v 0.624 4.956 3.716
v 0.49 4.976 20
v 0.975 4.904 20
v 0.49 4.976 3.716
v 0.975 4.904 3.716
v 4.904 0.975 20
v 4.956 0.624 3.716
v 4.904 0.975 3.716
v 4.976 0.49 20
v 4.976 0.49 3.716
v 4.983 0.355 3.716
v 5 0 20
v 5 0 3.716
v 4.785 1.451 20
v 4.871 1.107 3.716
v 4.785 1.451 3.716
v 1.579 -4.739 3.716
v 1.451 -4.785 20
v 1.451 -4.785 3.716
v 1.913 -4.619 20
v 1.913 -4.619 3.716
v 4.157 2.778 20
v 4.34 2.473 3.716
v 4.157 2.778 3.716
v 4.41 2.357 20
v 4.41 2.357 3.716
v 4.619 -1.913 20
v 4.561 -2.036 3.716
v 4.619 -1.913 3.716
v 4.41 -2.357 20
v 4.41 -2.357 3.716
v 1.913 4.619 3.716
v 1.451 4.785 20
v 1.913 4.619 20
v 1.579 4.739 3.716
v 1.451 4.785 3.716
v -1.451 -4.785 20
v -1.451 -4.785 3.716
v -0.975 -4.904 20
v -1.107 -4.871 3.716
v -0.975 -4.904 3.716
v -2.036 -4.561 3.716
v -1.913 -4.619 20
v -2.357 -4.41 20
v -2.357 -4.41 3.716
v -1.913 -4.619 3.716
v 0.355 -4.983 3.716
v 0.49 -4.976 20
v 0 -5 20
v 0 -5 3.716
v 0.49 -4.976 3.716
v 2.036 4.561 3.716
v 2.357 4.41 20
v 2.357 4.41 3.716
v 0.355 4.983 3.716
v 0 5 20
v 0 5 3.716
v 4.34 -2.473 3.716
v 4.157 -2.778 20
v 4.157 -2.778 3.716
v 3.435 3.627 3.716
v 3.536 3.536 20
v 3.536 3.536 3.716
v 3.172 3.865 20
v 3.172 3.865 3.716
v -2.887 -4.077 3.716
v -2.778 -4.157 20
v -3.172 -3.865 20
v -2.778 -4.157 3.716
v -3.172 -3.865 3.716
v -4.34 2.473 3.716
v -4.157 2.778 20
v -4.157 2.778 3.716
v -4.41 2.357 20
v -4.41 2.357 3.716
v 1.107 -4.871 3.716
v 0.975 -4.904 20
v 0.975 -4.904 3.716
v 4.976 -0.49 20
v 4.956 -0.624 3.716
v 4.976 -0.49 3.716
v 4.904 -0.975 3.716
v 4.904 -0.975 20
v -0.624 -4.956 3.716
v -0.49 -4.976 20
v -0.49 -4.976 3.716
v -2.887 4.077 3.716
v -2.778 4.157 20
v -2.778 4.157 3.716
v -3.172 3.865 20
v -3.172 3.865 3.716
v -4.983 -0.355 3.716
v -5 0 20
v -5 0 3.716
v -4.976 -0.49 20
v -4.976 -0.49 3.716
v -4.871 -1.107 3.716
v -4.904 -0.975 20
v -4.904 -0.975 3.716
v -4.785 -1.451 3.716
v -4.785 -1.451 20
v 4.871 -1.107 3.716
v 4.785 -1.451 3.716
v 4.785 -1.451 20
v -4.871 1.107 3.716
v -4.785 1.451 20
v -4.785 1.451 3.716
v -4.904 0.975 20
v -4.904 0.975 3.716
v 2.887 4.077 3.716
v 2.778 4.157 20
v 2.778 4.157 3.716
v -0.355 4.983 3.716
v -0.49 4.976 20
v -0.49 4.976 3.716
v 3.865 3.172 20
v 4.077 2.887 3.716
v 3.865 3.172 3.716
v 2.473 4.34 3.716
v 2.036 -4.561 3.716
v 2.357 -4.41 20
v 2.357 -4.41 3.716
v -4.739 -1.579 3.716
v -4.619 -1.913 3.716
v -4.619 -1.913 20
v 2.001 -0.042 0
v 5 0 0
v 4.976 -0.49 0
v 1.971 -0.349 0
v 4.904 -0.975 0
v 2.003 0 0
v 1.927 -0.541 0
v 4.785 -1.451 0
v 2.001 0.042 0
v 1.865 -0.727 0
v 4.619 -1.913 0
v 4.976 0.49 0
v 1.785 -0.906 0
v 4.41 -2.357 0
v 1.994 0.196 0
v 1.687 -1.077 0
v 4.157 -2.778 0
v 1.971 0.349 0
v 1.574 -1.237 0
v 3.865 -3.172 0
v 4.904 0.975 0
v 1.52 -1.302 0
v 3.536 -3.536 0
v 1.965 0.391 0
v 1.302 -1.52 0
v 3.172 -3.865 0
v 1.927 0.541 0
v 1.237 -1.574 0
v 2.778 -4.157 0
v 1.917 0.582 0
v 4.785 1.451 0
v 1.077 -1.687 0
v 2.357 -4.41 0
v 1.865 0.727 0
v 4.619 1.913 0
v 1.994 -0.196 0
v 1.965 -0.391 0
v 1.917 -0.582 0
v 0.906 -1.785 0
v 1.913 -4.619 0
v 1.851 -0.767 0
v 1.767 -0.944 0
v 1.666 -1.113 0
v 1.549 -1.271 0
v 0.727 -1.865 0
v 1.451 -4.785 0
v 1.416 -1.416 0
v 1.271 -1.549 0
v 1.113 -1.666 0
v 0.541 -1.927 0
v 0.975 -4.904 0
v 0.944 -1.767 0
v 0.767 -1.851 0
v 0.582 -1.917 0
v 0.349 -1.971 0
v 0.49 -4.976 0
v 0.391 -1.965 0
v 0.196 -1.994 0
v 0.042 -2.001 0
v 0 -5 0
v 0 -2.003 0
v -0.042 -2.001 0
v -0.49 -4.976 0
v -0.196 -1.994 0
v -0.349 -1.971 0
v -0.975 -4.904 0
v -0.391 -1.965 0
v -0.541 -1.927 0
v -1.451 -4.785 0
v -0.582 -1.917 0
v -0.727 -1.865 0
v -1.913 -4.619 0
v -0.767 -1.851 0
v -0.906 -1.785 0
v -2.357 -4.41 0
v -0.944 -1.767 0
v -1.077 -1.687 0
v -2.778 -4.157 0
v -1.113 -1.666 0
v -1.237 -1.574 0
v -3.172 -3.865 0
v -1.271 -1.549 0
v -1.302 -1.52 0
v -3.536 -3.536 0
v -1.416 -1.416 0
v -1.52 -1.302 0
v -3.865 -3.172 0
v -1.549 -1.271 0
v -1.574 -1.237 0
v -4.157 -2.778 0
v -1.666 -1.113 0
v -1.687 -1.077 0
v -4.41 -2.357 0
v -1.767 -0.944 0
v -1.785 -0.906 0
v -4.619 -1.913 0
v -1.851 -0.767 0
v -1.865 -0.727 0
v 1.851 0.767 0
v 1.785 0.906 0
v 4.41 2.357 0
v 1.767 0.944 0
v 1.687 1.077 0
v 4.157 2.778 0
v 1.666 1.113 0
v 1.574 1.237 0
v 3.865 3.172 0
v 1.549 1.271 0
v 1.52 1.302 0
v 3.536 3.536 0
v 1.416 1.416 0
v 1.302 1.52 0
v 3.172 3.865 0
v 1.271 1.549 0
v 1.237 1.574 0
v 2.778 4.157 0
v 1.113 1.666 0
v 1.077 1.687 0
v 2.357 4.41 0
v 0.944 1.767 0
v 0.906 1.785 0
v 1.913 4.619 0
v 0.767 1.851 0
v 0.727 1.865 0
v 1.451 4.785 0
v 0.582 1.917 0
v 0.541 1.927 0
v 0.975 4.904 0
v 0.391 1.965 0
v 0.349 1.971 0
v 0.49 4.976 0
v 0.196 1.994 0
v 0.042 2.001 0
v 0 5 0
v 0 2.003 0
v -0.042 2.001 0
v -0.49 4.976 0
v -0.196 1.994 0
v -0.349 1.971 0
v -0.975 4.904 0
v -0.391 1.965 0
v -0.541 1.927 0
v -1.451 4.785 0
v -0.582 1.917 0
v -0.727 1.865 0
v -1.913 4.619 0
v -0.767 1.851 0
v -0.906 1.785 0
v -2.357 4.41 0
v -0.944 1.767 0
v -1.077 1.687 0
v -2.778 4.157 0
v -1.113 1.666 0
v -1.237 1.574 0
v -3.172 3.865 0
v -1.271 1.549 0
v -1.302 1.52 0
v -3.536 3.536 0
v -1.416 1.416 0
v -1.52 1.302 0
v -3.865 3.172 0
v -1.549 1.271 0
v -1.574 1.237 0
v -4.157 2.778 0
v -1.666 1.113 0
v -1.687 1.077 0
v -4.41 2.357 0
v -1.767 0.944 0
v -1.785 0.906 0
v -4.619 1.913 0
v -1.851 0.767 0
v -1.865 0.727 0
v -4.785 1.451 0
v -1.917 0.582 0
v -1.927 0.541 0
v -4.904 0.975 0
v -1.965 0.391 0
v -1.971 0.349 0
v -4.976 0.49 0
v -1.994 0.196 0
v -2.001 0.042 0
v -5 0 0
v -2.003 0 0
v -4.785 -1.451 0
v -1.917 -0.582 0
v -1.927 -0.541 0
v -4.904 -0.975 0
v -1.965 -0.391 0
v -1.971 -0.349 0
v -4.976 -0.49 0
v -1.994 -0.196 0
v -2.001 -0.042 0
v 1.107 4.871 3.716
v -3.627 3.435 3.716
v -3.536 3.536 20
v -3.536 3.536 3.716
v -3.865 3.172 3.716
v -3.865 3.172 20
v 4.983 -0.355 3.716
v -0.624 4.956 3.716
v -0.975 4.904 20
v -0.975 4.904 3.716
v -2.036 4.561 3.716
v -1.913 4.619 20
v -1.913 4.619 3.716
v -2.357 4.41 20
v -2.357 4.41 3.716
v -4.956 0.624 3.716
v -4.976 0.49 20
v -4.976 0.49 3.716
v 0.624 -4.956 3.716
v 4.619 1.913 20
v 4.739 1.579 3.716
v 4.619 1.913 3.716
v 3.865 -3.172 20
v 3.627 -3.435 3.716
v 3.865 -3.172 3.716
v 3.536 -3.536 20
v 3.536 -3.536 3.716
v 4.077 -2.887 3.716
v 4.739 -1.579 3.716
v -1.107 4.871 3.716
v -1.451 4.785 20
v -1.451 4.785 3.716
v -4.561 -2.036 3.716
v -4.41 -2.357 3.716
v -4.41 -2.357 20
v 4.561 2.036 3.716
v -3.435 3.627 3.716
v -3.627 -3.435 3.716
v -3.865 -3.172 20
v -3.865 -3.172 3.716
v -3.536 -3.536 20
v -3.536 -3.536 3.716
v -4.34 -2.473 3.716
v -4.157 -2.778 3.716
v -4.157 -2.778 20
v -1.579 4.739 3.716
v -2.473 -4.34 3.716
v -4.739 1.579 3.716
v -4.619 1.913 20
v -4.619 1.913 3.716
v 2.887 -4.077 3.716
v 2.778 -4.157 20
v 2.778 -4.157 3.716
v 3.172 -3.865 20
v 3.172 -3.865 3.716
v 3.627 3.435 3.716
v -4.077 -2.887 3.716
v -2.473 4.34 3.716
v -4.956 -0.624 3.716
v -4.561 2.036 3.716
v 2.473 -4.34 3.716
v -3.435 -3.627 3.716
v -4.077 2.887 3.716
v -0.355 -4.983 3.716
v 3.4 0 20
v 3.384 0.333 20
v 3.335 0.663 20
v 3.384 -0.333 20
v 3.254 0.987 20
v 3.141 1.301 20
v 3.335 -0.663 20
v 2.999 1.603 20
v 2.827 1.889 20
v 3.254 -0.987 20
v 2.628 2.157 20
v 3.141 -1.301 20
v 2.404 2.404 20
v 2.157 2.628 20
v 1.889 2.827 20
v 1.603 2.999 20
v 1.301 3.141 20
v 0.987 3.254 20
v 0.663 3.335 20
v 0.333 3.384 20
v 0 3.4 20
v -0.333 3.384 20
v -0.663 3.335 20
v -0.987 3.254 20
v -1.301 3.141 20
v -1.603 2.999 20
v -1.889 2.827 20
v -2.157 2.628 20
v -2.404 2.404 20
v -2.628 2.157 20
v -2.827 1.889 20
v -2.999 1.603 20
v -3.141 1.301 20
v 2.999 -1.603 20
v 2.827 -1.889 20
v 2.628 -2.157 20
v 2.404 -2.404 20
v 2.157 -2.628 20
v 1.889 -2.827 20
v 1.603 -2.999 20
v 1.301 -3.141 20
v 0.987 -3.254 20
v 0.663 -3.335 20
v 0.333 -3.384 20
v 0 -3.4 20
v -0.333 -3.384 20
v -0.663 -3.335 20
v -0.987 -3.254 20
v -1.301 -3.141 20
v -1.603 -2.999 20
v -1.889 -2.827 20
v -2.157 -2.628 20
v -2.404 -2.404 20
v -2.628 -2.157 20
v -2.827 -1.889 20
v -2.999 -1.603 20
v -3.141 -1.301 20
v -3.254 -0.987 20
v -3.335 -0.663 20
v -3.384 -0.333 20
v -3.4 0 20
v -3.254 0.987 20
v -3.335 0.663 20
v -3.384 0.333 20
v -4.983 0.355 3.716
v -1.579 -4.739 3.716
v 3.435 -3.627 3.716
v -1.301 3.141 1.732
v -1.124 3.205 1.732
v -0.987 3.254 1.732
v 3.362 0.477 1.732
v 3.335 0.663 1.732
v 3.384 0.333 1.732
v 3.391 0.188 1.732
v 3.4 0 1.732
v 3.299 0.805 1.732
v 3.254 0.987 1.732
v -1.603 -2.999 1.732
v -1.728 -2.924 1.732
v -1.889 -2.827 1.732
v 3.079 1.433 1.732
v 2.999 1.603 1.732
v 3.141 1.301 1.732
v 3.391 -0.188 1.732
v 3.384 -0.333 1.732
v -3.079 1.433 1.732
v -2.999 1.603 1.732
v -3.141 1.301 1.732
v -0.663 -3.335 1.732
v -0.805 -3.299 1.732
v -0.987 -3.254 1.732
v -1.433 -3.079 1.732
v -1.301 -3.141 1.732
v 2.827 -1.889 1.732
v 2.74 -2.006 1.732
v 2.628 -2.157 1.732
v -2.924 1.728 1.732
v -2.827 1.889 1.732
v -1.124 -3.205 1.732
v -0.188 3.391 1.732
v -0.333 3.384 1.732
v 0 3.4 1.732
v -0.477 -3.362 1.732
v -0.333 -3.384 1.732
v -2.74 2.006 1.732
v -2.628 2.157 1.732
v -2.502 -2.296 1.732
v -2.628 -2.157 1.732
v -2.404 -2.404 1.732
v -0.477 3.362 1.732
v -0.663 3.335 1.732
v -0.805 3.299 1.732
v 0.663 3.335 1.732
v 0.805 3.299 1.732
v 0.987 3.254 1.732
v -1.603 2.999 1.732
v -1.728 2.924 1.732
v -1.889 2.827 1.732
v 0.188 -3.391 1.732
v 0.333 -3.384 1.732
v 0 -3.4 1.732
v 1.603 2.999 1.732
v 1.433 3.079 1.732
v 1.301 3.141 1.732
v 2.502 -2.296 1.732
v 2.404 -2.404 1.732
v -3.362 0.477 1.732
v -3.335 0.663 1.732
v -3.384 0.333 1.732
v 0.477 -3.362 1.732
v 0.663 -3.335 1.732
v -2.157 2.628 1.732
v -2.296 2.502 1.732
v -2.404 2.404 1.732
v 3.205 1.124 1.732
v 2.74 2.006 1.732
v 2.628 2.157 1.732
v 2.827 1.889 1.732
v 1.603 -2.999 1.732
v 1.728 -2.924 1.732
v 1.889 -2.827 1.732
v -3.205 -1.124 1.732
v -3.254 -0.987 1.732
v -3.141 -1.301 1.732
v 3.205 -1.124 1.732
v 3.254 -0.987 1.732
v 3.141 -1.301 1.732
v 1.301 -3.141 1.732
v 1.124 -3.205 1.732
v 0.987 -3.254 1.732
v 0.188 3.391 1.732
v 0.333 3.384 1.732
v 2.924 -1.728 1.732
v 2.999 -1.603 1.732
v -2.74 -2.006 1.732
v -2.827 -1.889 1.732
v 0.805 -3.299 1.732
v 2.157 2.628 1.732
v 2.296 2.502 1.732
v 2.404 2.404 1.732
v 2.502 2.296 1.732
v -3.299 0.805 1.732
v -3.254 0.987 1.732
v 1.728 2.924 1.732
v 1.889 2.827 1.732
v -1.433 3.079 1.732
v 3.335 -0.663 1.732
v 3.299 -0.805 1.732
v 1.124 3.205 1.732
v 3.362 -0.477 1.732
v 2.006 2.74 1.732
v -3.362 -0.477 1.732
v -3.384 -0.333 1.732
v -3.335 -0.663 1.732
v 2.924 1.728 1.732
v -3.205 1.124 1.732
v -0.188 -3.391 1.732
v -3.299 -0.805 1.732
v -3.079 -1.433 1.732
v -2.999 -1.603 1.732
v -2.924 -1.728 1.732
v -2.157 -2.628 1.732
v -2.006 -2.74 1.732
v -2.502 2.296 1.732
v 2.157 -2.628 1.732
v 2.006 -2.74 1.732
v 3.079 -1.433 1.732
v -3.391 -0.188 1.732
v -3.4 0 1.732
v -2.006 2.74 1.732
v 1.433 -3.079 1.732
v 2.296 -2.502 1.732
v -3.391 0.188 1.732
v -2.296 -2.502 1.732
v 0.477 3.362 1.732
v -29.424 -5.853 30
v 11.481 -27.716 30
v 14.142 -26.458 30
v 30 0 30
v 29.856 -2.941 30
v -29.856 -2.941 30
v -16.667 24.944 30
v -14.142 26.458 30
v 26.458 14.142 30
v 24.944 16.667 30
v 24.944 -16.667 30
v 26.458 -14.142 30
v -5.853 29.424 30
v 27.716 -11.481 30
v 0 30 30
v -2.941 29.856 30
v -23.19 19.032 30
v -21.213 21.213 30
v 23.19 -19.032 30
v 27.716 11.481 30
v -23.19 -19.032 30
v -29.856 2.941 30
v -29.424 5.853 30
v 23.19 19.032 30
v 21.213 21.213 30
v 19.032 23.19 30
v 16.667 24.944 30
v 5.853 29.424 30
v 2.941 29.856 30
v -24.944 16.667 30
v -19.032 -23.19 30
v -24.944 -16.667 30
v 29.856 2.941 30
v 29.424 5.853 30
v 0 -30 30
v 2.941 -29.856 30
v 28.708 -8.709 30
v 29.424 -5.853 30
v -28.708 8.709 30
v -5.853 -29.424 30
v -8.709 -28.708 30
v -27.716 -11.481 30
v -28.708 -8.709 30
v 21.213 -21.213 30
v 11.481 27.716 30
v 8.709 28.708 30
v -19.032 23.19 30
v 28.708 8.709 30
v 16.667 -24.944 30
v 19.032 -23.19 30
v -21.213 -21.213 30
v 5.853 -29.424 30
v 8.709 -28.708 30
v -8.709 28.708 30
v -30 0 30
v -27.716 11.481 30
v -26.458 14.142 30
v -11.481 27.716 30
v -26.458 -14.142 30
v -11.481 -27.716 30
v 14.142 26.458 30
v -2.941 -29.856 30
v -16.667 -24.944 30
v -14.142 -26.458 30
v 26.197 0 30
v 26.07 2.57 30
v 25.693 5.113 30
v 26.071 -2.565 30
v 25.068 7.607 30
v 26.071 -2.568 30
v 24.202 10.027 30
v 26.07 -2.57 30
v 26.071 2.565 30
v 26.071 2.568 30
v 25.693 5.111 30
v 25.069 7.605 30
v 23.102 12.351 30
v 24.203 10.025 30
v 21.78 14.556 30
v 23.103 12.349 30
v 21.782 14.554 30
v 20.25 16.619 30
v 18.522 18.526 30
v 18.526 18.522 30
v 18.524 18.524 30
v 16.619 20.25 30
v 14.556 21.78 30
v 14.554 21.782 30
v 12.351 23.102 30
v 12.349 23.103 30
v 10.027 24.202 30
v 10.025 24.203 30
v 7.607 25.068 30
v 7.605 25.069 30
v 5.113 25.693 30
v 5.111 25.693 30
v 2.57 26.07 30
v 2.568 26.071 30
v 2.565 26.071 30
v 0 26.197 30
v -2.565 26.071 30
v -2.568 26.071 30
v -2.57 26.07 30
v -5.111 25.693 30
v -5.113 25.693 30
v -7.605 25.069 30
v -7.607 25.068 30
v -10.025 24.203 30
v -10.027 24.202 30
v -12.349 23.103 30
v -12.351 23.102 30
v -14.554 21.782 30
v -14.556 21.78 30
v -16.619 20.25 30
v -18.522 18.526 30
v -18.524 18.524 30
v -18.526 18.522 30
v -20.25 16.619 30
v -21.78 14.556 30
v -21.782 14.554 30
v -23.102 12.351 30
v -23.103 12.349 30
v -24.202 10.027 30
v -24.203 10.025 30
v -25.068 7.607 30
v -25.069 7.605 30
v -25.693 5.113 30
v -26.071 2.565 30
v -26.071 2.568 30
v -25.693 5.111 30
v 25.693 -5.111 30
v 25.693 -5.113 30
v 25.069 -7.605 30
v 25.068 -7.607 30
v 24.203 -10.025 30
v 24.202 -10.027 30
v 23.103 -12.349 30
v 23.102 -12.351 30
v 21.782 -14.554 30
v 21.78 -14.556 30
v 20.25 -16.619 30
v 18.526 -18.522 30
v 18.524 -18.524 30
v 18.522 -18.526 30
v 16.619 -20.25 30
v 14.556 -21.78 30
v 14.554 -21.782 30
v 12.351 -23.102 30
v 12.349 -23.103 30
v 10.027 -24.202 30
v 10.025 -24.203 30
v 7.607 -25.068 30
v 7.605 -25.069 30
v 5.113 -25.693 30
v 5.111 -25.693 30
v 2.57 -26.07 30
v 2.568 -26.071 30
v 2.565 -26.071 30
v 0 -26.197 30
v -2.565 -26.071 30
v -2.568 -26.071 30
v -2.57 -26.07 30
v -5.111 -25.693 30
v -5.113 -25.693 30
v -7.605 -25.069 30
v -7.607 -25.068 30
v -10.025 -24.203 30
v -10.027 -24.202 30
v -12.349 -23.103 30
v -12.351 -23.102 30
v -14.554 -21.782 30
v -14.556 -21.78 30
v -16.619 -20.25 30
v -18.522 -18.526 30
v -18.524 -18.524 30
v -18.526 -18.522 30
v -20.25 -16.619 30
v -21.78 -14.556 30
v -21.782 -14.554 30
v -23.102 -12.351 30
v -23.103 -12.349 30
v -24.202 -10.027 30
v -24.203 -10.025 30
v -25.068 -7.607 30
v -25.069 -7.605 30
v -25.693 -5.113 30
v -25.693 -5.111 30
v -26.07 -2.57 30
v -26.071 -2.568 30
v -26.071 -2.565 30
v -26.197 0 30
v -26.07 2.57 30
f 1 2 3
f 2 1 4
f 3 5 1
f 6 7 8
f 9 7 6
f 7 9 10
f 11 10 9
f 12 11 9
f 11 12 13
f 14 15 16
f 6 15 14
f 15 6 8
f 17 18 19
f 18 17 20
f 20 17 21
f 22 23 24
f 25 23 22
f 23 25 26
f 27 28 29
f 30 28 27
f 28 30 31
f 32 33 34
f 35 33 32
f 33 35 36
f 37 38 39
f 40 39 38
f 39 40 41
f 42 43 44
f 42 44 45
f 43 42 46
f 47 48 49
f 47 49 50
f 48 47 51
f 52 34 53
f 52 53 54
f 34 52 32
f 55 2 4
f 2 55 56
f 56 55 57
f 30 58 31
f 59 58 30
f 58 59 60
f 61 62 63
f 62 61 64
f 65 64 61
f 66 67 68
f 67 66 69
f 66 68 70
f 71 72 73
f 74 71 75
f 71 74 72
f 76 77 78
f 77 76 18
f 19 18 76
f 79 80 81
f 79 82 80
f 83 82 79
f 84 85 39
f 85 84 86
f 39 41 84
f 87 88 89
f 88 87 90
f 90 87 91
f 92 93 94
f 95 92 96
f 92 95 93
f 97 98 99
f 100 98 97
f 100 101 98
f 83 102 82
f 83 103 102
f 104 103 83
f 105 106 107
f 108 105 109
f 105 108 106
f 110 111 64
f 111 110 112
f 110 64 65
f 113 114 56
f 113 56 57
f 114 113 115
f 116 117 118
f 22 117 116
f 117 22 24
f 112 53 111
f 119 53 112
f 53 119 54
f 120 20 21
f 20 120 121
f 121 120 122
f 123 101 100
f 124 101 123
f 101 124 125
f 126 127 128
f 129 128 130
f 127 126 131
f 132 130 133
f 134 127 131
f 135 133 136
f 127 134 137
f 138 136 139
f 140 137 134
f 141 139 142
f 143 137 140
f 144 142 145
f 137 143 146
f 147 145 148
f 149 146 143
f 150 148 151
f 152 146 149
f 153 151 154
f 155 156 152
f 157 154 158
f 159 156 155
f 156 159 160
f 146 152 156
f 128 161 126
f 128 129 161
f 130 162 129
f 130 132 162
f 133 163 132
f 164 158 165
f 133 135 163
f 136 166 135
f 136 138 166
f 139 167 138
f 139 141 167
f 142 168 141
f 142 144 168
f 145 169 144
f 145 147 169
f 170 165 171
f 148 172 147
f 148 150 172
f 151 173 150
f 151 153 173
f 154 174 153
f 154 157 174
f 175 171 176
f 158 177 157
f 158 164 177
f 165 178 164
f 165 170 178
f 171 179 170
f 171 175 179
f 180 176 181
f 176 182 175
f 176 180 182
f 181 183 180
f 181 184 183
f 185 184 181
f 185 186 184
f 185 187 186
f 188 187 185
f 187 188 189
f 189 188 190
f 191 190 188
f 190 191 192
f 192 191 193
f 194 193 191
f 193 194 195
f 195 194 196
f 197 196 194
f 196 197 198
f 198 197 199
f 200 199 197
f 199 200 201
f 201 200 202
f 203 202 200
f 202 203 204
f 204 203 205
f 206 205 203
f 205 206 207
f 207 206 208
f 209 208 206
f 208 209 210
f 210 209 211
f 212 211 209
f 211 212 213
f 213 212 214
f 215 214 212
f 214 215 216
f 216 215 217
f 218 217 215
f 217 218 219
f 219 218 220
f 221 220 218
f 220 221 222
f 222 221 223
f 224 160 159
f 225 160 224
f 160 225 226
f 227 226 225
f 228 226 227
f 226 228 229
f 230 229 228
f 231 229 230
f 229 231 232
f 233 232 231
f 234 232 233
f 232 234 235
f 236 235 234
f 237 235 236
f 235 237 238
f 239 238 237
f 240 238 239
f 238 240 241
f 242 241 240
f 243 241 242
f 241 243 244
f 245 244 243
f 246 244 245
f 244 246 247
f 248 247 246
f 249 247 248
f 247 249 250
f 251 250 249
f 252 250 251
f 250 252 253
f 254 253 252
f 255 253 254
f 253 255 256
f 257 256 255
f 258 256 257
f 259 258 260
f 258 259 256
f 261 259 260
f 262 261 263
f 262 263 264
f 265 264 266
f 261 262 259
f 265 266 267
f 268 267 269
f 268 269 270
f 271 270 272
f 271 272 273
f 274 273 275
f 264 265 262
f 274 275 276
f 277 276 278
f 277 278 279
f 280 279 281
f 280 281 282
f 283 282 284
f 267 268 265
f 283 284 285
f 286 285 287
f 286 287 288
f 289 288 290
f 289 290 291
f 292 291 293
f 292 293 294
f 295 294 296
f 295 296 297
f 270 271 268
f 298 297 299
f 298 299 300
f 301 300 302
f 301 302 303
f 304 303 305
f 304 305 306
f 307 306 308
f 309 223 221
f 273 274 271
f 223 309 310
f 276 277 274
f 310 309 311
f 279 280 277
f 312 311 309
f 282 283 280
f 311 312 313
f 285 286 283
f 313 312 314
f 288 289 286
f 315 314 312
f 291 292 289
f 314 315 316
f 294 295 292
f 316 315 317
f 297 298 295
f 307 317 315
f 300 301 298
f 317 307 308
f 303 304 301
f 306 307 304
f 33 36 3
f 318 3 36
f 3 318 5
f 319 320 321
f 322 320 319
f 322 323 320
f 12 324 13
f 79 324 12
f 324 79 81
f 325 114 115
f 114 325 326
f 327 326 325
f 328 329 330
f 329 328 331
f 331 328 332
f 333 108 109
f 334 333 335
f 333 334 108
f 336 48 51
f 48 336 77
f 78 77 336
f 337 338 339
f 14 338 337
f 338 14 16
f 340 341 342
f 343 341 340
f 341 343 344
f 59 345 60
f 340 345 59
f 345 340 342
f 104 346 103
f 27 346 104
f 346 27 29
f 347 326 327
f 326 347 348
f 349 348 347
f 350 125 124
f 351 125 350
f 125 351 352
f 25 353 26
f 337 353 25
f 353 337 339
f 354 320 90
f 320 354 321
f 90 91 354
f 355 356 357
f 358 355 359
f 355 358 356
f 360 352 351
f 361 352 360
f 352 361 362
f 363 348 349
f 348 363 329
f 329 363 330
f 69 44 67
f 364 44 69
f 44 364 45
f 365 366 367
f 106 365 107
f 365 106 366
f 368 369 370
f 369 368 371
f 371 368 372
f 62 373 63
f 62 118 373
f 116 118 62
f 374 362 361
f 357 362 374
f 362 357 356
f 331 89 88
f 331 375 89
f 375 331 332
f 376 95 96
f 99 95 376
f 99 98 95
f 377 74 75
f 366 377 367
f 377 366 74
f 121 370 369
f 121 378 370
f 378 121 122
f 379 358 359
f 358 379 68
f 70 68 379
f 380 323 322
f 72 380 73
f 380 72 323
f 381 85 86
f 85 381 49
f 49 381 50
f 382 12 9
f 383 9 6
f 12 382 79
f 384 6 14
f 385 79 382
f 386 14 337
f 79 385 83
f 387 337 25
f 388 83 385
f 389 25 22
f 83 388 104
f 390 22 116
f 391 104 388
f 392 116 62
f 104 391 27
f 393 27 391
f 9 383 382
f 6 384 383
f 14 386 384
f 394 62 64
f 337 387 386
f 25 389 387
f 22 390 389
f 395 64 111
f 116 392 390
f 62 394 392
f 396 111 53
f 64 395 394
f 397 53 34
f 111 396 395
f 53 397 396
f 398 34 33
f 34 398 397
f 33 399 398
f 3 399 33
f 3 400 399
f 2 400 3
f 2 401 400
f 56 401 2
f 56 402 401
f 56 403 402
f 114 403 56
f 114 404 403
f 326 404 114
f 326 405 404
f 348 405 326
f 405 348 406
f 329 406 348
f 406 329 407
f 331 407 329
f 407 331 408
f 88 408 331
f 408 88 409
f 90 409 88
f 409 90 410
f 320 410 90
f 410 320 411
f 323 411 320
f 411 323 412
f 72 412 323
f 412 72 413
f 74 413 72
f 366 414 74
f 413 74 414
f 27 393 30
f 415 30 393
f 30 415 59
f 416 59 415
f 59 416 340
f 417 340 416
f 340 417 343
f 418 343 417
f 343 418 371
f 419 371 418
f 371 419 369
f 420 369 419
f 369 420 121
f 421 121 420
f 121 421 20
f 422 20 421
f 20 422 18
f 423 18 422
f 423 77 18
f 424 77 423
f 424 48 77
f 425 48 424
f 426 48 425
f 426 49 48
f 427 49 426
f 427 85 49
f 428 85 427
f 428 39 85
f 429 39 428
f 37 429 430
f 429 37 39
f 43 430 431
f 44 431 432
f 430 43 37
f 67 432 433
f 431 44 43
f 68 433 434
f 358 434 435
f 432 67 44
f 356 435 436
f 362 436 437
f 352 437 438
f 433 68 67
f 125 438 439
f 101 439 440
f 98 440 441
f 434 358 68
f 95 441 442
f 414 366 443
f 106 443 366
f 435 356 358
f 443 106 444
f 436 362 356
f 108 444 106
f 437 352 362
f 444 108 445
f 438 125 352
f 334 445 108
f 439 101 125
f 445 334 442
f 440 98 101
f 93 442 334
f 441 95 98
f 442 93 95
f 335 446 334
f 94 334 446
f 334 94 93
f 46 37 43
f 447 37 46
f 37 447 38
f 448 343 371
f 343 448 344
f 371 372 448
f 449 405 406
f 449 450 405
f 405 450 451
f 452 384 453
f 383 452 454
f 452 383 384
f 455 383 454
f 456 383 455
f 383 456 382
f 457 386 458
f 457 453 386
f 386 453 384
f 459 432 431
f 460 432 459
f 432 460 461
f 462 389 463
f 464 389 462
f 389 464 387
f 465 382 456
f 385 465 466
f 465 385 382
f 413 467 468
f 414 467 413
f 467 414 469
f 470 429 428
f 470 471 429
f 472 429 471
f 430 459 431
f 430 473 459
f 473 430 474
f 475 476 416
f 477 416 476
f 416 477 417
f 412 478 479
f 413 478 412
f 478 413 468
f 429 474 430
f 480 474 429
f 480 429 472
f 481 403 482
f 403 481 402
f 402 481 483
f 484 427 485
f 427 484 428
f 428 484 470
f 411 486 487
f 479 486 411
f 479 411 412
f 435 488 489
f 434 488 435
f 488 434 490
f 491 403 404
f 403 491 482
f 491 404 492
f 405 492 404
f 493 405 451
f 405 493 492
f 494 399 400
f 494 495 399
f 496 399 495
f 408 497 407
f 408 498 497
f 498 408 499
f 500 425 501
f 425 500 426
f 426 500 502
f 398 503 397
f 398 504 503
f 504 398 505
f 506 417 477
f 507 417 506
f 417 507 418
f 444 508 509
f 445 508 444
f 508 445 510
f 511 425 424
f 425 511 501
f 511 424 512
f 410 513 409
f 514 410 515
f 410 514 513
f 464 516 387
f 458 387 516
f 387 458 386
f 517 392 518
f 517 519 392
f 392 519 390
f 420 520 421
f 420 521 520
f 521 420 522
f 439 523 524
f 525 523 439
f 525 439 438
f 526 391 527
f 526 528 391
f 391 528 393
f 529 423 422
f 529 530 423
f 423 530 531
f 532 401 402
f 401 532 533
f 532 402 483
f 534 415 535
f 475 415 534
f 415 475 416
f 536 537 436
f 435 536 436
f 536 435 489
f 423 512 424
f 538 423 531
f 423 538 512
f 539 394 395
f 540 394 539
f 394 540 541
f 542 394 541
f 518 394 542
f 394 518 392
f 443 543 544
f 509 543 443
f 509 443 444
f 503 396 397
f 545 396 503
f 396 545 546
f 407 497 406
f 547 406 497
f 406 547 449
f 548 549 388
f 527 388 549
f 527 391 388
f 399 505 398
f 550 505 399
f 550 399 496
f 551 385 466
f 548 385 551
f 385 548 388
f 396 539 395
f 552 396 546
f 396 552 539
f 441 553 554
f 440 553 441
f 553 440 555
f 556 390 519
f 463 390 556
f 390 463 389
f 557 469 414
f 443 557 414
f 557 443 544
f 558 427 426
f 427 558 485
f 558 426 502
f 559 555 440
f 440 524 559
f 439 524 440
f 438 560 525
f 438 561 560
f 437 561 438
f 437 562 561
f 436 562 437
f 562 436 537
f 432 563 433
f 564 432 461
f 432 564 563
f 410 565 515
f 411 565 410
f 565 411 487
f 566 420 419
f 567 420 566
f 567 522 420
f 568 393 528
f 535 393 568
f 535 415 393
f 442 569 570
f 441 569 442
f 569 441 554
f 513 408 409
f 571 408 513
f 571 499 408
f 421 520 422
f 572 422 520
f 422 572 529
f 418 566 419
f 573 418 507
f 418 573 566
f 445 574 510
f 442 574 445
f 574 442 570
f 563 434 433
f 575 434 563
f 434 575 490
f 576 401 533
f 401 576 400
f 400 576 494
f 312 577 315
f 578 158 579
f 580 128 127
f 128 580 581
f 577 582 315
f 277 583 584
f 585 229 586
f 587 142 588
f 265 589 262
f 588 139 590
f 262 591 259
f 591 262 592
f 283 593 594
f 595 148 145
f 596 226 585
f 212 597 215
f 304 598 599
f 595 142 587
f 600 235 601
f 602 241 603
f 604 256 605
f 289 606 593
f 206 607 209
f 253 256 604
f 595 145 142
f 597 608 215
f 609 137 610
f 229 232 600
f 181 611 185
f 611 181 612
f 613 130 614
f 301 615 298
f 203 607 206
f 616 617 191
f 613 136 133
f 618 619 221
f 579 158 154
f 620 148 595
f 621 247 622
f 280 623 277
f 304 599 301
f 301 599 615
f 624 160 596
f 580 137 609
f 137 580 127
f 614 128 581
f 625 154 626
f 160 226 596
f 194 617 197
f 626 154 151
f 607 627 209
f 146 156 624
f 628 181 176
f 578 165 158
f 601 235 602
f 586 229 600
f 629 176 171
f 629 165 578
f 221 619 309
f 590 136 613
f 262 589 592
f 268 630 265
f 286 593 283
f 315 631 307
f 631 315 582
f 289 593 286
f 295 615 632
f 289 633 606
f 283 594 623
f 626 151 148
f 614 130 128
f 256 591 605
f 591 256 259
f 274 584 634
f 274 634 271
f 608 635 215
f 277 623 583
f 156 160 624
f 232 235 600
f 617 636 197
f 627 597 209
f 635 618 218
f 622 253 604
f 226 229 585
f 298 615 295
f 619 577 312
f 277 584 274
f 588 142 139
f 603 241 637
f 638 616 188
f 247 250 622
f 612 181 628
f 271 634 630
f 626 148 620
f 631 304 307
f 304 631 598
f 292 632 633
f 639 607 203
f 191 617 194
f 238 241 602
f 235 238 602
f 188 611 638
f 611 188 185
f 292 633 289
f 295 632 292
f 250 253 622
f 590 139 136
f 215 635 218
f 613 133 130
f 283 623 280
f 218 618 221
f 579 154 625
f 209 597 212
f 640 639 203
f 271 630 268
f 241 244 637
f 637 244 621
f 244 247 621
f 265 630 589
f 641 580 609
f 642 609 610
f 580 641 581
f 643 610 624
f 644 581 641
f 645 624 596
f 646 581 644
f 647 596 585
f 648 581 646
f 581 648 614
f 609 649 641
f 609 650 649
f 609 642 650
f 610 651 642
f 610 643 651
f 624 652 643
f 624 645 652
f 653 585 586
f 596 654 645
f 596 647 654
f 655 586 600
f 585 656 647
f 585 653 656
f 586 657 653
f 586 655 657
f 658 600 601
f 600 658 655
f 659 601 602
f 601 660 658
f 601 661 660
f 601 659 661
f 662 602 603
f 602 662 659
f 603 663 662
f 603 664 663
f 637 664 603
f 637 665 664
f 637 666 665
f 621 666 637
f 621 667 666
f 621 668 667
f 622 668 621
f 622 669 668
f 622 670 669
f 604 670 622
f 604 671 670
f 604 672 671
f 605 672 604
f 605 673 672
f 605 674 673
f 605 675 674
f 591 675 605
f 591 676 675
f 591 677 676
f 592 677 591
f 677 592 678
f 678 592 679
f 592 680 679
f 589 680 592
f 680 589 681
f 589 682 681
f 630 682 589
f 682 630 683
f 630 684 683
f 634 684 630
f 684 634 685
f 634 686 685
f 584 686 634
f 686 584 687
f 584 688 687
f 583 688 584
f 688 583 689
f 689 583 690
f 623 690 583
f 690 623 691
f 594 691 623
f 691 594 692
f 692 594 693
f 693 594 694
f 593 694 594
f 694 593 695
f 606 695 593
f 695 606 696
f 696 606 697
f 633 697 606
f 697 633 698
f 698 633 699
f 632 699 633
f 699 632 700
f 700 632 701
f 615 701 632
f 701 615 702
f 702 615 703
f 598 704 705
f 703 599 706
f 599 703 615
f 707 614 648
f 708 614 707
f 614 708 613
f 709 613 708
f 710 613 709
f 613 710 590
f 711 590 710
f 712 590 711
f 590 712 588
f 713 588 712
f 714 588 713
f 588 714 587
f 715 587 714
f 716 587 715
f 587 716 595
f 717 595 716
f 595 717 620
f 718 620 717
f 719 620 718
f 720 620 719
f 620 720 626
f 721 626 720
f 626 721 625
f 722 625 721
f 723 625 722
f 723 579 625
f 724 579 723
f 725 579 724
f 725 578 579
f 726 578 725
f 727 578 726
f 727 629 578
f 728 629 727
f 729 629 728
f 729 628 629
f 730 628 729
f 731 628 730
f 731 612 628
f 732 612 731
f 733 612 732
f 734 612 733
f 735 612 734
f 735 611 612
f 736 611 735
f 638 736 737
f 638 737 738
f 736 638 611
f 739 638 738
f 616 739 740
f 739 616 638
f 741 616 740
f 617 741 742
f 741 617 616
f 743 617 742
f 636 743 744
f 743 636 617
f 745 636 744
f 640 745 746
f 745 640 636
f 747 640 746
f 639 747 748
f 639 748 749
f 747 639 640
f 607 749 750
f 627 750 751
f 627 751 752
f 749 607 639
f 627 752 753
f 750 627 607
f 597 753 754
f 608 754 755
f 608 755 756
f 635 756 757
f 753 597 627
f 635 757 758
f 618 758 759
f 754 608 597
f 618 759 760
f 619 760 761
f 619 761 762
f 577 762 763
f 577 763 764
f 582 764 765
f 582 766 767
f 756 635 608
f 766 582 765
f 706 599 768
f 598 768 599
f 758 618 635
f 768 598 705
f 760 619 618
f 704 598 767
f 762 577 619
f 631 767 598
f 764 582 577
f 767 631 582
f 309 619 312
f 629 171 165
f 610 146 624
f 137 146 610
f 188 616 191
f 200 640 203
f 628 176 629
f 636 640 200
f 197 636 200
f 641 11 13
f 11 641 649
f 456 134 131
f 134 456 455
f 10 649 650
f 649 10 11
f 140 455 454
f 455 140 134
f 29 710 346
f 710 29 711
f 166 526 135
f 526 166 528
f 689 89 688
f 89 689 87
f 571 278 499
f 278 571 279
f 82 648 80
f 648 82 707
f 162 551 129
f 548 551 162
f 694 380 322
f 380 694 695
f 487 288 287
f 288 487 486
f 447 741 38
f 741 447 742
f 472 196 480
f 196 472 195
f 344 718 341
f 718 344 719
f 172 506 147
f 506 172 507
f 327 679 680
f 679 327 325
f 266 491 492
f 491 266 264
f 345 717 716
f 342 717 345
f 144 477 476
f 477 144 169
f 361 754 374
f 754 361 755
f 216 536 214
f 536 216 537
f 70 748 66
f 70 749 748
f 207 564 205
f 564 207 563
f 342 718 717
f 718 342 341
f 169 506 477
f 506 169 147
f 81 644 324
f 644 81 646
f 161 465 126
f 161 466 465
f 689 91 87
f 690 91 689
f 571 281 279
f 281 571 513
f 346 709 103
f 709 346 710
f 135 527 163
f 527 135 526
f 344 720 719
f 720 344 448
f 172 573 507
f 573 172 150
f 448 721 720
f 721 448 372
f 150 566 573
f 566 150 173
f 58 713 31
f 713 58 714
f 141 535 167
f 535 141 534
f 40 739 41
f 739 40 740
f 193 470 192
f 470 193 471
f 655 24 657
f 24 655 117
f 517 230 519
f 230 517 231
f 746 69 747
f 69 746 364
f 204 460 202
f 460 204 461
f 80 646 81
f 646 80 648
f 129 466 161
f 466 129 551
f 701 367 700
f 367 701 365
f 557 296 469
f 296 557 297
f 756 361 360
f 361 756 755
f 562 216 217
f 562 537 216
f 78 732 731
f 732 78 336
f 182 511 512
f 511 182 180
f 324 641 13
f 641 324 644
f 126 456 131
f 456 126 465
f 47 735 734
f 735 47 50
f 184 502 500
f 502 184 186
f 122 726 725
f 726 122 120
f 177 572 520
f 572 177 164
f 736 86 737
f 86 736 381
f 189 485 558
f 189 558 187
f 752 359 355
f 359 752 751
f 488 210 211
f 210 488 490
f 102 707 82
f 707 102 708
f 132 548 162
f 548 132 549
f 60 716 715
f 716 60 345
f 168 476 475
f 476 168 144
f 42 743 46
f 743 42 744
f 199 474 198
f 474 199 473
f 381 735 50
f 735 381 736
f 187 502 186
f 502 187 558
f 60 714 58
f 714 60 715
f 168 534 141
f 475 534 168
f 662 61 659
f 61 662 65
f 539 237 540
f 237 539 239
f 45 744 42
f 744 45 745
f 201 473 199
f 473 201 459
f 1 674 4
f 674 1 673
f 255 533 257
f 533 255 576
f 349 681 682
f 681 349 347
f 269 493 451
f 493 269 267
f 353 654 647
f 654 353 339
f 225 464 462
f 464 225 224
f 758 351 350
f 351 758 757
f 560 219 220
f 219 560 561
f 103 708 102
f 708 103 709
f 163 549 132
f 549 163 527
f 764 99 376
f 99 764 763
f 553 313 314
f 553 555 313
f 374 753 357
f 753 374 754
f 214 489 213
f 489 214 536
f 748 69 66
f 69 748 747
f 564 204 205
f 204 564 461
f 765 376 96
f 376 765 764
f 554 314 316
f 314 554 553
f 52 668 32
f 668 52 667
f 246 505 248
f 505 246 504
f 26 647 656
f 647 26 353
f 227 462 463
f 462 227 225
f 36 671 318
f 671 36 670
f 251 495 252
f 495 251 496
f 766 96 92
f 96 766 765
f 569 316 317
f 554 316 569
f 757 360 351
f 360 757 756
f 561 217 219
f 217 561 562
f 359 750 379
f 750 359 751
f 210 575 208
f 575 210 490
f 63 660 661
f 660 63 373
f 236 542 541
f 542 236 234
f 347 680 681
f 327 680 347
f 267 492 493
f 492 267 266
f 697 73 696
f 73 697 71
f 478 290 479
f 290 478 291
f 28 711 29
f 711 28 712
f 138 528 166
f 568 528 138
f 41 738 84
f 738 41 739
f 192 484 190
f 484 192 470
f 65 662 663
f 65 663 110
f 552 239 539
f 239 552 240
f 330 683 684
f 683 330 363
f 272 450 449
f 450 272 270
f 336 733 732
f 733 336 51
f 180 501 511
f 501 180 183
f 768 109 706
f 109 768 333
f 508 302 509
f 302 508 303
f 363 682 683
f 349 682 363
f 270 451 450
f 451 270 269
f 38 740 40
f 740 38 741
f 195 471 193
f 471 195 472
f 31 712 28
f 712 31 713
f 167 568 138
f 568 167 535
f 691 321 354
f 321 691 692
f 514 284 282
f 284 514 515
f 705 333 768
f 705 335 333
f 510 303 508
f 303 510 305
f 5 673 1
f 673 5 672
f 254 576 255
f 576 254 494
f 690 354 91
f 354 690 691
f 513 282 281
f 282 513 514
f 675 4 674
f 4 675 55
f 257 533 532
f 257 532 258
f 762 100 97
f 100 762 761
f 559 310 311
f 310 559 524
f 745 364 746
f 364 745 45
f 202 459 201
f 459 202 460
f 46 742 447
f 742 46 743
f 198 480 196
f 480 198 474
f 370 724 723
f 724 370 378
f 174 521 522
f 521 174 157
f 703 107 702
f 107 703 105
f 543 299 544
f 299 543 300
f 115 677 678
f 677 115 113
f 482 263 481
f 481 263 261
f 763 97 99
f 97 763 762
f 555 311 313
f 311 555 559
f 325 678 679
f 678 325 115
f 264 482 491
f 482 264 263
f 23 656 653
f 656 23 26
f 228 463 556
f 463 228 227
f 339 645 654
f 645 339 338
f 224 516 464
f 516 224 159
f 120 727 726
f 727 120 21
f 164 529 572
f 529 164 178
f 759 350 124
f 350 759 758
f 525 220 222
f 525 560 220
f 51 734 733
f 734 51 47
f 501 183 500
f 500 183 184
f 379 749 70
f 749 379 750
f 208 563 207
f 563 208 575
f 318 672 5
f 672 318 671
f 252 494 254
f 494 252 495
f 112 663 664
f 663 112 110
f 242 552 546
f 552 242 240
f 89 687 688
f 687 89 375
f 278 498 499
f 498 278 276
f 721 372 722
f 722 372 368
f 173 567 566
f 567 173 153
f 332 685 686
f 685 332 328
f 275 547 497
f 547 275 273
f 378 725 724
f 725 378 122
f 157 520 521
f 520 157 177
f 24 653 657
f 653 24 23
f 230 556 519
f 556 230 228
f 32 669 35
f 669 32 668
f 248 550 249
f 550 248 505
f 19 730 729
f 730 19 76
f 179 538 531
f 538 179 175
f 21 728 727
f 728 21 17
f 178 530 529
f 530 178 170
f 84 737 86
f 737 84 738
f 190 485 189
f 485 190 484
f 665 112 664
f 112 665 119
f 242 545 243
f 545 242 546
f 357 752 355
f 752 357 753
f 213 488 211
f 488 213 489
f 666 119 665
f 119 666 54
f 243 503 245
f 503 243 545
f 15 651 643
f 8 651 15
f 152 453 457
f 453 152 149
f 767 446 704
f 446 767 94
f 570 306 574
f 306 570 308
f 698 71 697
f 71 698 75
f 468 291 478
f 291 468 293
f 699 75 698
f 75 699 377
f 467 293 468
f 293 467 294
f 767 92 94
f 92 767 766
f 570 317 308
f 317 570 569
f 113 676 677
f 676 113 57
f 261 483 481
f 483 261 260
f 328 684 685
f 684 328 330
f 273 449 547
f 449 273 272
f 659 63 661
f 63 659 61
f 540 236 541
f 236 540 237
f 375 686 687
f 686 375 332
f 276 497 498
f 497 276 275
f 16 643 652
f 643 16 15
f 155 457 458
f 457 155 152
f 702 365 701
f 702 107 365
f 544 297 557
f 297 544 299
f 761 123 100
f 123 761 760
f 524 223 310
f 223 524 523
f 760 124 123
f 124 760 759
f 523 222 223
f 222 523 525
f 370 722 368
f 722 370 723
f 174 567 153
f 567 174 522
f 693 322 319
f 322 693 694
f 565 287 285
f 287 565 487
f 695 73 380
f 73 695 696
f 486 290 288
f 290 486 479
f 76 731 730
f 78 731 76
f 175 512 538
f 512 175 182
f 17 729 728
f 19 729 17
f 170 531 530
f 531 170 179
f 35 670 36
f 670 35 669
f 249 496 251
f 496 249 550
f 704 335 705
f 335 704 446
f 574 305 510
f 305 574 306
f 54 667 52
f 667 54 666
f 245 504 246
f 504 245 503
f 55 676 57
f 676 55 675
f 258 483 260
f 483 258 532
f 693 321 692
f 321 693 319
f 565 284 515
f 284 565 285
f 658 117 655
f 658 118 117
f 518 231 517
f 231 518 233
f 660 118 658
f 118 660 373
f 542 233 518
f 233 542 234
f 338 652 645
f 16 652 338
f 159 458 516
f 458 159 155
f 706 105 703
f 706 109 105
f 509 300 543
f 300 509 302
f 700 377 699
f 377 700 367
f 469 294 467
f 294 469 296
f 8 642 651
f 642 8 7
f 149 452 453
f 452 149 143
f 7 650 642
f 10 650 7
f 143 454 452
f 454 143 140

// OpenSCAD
// Lab funnel - printed upright, open at top and bottom
// Units: mm

$fn = 64;

// Spout
spout_d     = 10;    // outer diameter
spout_bore  = 6.8;   // bore diameter (wall 1.6)
spout_h     = 20;    // length

// Cone
cone_d1     = 10;    // diameter at z = 20
cone_d2     = 60;    // rim diameter at z = 50
cone_h      = 30;    // height of cone (50 - 20)

// Cut clearance
eps         = 0.5;   // extension past faces

union() {
    // Spout tube
    difference() {
        cylinder(d = spout_d, h = spout_h);
        translate([0, 0, -eps]) cylinder(d = spout_bore, h = spout_h + 2 * eps);
    }

    // Cone (hollow, open top and bottom)
    difference() {
        cylinder(d1 = cone_d1, d2 = cone_d2, h = cone_h);
        translate([0, 0, -eps])
            cylinder(d1 = cone_d1 - spout_bore, d2 = cone_d2 - spout_bore, h = cone_h + 2 * eps);
    }
}
